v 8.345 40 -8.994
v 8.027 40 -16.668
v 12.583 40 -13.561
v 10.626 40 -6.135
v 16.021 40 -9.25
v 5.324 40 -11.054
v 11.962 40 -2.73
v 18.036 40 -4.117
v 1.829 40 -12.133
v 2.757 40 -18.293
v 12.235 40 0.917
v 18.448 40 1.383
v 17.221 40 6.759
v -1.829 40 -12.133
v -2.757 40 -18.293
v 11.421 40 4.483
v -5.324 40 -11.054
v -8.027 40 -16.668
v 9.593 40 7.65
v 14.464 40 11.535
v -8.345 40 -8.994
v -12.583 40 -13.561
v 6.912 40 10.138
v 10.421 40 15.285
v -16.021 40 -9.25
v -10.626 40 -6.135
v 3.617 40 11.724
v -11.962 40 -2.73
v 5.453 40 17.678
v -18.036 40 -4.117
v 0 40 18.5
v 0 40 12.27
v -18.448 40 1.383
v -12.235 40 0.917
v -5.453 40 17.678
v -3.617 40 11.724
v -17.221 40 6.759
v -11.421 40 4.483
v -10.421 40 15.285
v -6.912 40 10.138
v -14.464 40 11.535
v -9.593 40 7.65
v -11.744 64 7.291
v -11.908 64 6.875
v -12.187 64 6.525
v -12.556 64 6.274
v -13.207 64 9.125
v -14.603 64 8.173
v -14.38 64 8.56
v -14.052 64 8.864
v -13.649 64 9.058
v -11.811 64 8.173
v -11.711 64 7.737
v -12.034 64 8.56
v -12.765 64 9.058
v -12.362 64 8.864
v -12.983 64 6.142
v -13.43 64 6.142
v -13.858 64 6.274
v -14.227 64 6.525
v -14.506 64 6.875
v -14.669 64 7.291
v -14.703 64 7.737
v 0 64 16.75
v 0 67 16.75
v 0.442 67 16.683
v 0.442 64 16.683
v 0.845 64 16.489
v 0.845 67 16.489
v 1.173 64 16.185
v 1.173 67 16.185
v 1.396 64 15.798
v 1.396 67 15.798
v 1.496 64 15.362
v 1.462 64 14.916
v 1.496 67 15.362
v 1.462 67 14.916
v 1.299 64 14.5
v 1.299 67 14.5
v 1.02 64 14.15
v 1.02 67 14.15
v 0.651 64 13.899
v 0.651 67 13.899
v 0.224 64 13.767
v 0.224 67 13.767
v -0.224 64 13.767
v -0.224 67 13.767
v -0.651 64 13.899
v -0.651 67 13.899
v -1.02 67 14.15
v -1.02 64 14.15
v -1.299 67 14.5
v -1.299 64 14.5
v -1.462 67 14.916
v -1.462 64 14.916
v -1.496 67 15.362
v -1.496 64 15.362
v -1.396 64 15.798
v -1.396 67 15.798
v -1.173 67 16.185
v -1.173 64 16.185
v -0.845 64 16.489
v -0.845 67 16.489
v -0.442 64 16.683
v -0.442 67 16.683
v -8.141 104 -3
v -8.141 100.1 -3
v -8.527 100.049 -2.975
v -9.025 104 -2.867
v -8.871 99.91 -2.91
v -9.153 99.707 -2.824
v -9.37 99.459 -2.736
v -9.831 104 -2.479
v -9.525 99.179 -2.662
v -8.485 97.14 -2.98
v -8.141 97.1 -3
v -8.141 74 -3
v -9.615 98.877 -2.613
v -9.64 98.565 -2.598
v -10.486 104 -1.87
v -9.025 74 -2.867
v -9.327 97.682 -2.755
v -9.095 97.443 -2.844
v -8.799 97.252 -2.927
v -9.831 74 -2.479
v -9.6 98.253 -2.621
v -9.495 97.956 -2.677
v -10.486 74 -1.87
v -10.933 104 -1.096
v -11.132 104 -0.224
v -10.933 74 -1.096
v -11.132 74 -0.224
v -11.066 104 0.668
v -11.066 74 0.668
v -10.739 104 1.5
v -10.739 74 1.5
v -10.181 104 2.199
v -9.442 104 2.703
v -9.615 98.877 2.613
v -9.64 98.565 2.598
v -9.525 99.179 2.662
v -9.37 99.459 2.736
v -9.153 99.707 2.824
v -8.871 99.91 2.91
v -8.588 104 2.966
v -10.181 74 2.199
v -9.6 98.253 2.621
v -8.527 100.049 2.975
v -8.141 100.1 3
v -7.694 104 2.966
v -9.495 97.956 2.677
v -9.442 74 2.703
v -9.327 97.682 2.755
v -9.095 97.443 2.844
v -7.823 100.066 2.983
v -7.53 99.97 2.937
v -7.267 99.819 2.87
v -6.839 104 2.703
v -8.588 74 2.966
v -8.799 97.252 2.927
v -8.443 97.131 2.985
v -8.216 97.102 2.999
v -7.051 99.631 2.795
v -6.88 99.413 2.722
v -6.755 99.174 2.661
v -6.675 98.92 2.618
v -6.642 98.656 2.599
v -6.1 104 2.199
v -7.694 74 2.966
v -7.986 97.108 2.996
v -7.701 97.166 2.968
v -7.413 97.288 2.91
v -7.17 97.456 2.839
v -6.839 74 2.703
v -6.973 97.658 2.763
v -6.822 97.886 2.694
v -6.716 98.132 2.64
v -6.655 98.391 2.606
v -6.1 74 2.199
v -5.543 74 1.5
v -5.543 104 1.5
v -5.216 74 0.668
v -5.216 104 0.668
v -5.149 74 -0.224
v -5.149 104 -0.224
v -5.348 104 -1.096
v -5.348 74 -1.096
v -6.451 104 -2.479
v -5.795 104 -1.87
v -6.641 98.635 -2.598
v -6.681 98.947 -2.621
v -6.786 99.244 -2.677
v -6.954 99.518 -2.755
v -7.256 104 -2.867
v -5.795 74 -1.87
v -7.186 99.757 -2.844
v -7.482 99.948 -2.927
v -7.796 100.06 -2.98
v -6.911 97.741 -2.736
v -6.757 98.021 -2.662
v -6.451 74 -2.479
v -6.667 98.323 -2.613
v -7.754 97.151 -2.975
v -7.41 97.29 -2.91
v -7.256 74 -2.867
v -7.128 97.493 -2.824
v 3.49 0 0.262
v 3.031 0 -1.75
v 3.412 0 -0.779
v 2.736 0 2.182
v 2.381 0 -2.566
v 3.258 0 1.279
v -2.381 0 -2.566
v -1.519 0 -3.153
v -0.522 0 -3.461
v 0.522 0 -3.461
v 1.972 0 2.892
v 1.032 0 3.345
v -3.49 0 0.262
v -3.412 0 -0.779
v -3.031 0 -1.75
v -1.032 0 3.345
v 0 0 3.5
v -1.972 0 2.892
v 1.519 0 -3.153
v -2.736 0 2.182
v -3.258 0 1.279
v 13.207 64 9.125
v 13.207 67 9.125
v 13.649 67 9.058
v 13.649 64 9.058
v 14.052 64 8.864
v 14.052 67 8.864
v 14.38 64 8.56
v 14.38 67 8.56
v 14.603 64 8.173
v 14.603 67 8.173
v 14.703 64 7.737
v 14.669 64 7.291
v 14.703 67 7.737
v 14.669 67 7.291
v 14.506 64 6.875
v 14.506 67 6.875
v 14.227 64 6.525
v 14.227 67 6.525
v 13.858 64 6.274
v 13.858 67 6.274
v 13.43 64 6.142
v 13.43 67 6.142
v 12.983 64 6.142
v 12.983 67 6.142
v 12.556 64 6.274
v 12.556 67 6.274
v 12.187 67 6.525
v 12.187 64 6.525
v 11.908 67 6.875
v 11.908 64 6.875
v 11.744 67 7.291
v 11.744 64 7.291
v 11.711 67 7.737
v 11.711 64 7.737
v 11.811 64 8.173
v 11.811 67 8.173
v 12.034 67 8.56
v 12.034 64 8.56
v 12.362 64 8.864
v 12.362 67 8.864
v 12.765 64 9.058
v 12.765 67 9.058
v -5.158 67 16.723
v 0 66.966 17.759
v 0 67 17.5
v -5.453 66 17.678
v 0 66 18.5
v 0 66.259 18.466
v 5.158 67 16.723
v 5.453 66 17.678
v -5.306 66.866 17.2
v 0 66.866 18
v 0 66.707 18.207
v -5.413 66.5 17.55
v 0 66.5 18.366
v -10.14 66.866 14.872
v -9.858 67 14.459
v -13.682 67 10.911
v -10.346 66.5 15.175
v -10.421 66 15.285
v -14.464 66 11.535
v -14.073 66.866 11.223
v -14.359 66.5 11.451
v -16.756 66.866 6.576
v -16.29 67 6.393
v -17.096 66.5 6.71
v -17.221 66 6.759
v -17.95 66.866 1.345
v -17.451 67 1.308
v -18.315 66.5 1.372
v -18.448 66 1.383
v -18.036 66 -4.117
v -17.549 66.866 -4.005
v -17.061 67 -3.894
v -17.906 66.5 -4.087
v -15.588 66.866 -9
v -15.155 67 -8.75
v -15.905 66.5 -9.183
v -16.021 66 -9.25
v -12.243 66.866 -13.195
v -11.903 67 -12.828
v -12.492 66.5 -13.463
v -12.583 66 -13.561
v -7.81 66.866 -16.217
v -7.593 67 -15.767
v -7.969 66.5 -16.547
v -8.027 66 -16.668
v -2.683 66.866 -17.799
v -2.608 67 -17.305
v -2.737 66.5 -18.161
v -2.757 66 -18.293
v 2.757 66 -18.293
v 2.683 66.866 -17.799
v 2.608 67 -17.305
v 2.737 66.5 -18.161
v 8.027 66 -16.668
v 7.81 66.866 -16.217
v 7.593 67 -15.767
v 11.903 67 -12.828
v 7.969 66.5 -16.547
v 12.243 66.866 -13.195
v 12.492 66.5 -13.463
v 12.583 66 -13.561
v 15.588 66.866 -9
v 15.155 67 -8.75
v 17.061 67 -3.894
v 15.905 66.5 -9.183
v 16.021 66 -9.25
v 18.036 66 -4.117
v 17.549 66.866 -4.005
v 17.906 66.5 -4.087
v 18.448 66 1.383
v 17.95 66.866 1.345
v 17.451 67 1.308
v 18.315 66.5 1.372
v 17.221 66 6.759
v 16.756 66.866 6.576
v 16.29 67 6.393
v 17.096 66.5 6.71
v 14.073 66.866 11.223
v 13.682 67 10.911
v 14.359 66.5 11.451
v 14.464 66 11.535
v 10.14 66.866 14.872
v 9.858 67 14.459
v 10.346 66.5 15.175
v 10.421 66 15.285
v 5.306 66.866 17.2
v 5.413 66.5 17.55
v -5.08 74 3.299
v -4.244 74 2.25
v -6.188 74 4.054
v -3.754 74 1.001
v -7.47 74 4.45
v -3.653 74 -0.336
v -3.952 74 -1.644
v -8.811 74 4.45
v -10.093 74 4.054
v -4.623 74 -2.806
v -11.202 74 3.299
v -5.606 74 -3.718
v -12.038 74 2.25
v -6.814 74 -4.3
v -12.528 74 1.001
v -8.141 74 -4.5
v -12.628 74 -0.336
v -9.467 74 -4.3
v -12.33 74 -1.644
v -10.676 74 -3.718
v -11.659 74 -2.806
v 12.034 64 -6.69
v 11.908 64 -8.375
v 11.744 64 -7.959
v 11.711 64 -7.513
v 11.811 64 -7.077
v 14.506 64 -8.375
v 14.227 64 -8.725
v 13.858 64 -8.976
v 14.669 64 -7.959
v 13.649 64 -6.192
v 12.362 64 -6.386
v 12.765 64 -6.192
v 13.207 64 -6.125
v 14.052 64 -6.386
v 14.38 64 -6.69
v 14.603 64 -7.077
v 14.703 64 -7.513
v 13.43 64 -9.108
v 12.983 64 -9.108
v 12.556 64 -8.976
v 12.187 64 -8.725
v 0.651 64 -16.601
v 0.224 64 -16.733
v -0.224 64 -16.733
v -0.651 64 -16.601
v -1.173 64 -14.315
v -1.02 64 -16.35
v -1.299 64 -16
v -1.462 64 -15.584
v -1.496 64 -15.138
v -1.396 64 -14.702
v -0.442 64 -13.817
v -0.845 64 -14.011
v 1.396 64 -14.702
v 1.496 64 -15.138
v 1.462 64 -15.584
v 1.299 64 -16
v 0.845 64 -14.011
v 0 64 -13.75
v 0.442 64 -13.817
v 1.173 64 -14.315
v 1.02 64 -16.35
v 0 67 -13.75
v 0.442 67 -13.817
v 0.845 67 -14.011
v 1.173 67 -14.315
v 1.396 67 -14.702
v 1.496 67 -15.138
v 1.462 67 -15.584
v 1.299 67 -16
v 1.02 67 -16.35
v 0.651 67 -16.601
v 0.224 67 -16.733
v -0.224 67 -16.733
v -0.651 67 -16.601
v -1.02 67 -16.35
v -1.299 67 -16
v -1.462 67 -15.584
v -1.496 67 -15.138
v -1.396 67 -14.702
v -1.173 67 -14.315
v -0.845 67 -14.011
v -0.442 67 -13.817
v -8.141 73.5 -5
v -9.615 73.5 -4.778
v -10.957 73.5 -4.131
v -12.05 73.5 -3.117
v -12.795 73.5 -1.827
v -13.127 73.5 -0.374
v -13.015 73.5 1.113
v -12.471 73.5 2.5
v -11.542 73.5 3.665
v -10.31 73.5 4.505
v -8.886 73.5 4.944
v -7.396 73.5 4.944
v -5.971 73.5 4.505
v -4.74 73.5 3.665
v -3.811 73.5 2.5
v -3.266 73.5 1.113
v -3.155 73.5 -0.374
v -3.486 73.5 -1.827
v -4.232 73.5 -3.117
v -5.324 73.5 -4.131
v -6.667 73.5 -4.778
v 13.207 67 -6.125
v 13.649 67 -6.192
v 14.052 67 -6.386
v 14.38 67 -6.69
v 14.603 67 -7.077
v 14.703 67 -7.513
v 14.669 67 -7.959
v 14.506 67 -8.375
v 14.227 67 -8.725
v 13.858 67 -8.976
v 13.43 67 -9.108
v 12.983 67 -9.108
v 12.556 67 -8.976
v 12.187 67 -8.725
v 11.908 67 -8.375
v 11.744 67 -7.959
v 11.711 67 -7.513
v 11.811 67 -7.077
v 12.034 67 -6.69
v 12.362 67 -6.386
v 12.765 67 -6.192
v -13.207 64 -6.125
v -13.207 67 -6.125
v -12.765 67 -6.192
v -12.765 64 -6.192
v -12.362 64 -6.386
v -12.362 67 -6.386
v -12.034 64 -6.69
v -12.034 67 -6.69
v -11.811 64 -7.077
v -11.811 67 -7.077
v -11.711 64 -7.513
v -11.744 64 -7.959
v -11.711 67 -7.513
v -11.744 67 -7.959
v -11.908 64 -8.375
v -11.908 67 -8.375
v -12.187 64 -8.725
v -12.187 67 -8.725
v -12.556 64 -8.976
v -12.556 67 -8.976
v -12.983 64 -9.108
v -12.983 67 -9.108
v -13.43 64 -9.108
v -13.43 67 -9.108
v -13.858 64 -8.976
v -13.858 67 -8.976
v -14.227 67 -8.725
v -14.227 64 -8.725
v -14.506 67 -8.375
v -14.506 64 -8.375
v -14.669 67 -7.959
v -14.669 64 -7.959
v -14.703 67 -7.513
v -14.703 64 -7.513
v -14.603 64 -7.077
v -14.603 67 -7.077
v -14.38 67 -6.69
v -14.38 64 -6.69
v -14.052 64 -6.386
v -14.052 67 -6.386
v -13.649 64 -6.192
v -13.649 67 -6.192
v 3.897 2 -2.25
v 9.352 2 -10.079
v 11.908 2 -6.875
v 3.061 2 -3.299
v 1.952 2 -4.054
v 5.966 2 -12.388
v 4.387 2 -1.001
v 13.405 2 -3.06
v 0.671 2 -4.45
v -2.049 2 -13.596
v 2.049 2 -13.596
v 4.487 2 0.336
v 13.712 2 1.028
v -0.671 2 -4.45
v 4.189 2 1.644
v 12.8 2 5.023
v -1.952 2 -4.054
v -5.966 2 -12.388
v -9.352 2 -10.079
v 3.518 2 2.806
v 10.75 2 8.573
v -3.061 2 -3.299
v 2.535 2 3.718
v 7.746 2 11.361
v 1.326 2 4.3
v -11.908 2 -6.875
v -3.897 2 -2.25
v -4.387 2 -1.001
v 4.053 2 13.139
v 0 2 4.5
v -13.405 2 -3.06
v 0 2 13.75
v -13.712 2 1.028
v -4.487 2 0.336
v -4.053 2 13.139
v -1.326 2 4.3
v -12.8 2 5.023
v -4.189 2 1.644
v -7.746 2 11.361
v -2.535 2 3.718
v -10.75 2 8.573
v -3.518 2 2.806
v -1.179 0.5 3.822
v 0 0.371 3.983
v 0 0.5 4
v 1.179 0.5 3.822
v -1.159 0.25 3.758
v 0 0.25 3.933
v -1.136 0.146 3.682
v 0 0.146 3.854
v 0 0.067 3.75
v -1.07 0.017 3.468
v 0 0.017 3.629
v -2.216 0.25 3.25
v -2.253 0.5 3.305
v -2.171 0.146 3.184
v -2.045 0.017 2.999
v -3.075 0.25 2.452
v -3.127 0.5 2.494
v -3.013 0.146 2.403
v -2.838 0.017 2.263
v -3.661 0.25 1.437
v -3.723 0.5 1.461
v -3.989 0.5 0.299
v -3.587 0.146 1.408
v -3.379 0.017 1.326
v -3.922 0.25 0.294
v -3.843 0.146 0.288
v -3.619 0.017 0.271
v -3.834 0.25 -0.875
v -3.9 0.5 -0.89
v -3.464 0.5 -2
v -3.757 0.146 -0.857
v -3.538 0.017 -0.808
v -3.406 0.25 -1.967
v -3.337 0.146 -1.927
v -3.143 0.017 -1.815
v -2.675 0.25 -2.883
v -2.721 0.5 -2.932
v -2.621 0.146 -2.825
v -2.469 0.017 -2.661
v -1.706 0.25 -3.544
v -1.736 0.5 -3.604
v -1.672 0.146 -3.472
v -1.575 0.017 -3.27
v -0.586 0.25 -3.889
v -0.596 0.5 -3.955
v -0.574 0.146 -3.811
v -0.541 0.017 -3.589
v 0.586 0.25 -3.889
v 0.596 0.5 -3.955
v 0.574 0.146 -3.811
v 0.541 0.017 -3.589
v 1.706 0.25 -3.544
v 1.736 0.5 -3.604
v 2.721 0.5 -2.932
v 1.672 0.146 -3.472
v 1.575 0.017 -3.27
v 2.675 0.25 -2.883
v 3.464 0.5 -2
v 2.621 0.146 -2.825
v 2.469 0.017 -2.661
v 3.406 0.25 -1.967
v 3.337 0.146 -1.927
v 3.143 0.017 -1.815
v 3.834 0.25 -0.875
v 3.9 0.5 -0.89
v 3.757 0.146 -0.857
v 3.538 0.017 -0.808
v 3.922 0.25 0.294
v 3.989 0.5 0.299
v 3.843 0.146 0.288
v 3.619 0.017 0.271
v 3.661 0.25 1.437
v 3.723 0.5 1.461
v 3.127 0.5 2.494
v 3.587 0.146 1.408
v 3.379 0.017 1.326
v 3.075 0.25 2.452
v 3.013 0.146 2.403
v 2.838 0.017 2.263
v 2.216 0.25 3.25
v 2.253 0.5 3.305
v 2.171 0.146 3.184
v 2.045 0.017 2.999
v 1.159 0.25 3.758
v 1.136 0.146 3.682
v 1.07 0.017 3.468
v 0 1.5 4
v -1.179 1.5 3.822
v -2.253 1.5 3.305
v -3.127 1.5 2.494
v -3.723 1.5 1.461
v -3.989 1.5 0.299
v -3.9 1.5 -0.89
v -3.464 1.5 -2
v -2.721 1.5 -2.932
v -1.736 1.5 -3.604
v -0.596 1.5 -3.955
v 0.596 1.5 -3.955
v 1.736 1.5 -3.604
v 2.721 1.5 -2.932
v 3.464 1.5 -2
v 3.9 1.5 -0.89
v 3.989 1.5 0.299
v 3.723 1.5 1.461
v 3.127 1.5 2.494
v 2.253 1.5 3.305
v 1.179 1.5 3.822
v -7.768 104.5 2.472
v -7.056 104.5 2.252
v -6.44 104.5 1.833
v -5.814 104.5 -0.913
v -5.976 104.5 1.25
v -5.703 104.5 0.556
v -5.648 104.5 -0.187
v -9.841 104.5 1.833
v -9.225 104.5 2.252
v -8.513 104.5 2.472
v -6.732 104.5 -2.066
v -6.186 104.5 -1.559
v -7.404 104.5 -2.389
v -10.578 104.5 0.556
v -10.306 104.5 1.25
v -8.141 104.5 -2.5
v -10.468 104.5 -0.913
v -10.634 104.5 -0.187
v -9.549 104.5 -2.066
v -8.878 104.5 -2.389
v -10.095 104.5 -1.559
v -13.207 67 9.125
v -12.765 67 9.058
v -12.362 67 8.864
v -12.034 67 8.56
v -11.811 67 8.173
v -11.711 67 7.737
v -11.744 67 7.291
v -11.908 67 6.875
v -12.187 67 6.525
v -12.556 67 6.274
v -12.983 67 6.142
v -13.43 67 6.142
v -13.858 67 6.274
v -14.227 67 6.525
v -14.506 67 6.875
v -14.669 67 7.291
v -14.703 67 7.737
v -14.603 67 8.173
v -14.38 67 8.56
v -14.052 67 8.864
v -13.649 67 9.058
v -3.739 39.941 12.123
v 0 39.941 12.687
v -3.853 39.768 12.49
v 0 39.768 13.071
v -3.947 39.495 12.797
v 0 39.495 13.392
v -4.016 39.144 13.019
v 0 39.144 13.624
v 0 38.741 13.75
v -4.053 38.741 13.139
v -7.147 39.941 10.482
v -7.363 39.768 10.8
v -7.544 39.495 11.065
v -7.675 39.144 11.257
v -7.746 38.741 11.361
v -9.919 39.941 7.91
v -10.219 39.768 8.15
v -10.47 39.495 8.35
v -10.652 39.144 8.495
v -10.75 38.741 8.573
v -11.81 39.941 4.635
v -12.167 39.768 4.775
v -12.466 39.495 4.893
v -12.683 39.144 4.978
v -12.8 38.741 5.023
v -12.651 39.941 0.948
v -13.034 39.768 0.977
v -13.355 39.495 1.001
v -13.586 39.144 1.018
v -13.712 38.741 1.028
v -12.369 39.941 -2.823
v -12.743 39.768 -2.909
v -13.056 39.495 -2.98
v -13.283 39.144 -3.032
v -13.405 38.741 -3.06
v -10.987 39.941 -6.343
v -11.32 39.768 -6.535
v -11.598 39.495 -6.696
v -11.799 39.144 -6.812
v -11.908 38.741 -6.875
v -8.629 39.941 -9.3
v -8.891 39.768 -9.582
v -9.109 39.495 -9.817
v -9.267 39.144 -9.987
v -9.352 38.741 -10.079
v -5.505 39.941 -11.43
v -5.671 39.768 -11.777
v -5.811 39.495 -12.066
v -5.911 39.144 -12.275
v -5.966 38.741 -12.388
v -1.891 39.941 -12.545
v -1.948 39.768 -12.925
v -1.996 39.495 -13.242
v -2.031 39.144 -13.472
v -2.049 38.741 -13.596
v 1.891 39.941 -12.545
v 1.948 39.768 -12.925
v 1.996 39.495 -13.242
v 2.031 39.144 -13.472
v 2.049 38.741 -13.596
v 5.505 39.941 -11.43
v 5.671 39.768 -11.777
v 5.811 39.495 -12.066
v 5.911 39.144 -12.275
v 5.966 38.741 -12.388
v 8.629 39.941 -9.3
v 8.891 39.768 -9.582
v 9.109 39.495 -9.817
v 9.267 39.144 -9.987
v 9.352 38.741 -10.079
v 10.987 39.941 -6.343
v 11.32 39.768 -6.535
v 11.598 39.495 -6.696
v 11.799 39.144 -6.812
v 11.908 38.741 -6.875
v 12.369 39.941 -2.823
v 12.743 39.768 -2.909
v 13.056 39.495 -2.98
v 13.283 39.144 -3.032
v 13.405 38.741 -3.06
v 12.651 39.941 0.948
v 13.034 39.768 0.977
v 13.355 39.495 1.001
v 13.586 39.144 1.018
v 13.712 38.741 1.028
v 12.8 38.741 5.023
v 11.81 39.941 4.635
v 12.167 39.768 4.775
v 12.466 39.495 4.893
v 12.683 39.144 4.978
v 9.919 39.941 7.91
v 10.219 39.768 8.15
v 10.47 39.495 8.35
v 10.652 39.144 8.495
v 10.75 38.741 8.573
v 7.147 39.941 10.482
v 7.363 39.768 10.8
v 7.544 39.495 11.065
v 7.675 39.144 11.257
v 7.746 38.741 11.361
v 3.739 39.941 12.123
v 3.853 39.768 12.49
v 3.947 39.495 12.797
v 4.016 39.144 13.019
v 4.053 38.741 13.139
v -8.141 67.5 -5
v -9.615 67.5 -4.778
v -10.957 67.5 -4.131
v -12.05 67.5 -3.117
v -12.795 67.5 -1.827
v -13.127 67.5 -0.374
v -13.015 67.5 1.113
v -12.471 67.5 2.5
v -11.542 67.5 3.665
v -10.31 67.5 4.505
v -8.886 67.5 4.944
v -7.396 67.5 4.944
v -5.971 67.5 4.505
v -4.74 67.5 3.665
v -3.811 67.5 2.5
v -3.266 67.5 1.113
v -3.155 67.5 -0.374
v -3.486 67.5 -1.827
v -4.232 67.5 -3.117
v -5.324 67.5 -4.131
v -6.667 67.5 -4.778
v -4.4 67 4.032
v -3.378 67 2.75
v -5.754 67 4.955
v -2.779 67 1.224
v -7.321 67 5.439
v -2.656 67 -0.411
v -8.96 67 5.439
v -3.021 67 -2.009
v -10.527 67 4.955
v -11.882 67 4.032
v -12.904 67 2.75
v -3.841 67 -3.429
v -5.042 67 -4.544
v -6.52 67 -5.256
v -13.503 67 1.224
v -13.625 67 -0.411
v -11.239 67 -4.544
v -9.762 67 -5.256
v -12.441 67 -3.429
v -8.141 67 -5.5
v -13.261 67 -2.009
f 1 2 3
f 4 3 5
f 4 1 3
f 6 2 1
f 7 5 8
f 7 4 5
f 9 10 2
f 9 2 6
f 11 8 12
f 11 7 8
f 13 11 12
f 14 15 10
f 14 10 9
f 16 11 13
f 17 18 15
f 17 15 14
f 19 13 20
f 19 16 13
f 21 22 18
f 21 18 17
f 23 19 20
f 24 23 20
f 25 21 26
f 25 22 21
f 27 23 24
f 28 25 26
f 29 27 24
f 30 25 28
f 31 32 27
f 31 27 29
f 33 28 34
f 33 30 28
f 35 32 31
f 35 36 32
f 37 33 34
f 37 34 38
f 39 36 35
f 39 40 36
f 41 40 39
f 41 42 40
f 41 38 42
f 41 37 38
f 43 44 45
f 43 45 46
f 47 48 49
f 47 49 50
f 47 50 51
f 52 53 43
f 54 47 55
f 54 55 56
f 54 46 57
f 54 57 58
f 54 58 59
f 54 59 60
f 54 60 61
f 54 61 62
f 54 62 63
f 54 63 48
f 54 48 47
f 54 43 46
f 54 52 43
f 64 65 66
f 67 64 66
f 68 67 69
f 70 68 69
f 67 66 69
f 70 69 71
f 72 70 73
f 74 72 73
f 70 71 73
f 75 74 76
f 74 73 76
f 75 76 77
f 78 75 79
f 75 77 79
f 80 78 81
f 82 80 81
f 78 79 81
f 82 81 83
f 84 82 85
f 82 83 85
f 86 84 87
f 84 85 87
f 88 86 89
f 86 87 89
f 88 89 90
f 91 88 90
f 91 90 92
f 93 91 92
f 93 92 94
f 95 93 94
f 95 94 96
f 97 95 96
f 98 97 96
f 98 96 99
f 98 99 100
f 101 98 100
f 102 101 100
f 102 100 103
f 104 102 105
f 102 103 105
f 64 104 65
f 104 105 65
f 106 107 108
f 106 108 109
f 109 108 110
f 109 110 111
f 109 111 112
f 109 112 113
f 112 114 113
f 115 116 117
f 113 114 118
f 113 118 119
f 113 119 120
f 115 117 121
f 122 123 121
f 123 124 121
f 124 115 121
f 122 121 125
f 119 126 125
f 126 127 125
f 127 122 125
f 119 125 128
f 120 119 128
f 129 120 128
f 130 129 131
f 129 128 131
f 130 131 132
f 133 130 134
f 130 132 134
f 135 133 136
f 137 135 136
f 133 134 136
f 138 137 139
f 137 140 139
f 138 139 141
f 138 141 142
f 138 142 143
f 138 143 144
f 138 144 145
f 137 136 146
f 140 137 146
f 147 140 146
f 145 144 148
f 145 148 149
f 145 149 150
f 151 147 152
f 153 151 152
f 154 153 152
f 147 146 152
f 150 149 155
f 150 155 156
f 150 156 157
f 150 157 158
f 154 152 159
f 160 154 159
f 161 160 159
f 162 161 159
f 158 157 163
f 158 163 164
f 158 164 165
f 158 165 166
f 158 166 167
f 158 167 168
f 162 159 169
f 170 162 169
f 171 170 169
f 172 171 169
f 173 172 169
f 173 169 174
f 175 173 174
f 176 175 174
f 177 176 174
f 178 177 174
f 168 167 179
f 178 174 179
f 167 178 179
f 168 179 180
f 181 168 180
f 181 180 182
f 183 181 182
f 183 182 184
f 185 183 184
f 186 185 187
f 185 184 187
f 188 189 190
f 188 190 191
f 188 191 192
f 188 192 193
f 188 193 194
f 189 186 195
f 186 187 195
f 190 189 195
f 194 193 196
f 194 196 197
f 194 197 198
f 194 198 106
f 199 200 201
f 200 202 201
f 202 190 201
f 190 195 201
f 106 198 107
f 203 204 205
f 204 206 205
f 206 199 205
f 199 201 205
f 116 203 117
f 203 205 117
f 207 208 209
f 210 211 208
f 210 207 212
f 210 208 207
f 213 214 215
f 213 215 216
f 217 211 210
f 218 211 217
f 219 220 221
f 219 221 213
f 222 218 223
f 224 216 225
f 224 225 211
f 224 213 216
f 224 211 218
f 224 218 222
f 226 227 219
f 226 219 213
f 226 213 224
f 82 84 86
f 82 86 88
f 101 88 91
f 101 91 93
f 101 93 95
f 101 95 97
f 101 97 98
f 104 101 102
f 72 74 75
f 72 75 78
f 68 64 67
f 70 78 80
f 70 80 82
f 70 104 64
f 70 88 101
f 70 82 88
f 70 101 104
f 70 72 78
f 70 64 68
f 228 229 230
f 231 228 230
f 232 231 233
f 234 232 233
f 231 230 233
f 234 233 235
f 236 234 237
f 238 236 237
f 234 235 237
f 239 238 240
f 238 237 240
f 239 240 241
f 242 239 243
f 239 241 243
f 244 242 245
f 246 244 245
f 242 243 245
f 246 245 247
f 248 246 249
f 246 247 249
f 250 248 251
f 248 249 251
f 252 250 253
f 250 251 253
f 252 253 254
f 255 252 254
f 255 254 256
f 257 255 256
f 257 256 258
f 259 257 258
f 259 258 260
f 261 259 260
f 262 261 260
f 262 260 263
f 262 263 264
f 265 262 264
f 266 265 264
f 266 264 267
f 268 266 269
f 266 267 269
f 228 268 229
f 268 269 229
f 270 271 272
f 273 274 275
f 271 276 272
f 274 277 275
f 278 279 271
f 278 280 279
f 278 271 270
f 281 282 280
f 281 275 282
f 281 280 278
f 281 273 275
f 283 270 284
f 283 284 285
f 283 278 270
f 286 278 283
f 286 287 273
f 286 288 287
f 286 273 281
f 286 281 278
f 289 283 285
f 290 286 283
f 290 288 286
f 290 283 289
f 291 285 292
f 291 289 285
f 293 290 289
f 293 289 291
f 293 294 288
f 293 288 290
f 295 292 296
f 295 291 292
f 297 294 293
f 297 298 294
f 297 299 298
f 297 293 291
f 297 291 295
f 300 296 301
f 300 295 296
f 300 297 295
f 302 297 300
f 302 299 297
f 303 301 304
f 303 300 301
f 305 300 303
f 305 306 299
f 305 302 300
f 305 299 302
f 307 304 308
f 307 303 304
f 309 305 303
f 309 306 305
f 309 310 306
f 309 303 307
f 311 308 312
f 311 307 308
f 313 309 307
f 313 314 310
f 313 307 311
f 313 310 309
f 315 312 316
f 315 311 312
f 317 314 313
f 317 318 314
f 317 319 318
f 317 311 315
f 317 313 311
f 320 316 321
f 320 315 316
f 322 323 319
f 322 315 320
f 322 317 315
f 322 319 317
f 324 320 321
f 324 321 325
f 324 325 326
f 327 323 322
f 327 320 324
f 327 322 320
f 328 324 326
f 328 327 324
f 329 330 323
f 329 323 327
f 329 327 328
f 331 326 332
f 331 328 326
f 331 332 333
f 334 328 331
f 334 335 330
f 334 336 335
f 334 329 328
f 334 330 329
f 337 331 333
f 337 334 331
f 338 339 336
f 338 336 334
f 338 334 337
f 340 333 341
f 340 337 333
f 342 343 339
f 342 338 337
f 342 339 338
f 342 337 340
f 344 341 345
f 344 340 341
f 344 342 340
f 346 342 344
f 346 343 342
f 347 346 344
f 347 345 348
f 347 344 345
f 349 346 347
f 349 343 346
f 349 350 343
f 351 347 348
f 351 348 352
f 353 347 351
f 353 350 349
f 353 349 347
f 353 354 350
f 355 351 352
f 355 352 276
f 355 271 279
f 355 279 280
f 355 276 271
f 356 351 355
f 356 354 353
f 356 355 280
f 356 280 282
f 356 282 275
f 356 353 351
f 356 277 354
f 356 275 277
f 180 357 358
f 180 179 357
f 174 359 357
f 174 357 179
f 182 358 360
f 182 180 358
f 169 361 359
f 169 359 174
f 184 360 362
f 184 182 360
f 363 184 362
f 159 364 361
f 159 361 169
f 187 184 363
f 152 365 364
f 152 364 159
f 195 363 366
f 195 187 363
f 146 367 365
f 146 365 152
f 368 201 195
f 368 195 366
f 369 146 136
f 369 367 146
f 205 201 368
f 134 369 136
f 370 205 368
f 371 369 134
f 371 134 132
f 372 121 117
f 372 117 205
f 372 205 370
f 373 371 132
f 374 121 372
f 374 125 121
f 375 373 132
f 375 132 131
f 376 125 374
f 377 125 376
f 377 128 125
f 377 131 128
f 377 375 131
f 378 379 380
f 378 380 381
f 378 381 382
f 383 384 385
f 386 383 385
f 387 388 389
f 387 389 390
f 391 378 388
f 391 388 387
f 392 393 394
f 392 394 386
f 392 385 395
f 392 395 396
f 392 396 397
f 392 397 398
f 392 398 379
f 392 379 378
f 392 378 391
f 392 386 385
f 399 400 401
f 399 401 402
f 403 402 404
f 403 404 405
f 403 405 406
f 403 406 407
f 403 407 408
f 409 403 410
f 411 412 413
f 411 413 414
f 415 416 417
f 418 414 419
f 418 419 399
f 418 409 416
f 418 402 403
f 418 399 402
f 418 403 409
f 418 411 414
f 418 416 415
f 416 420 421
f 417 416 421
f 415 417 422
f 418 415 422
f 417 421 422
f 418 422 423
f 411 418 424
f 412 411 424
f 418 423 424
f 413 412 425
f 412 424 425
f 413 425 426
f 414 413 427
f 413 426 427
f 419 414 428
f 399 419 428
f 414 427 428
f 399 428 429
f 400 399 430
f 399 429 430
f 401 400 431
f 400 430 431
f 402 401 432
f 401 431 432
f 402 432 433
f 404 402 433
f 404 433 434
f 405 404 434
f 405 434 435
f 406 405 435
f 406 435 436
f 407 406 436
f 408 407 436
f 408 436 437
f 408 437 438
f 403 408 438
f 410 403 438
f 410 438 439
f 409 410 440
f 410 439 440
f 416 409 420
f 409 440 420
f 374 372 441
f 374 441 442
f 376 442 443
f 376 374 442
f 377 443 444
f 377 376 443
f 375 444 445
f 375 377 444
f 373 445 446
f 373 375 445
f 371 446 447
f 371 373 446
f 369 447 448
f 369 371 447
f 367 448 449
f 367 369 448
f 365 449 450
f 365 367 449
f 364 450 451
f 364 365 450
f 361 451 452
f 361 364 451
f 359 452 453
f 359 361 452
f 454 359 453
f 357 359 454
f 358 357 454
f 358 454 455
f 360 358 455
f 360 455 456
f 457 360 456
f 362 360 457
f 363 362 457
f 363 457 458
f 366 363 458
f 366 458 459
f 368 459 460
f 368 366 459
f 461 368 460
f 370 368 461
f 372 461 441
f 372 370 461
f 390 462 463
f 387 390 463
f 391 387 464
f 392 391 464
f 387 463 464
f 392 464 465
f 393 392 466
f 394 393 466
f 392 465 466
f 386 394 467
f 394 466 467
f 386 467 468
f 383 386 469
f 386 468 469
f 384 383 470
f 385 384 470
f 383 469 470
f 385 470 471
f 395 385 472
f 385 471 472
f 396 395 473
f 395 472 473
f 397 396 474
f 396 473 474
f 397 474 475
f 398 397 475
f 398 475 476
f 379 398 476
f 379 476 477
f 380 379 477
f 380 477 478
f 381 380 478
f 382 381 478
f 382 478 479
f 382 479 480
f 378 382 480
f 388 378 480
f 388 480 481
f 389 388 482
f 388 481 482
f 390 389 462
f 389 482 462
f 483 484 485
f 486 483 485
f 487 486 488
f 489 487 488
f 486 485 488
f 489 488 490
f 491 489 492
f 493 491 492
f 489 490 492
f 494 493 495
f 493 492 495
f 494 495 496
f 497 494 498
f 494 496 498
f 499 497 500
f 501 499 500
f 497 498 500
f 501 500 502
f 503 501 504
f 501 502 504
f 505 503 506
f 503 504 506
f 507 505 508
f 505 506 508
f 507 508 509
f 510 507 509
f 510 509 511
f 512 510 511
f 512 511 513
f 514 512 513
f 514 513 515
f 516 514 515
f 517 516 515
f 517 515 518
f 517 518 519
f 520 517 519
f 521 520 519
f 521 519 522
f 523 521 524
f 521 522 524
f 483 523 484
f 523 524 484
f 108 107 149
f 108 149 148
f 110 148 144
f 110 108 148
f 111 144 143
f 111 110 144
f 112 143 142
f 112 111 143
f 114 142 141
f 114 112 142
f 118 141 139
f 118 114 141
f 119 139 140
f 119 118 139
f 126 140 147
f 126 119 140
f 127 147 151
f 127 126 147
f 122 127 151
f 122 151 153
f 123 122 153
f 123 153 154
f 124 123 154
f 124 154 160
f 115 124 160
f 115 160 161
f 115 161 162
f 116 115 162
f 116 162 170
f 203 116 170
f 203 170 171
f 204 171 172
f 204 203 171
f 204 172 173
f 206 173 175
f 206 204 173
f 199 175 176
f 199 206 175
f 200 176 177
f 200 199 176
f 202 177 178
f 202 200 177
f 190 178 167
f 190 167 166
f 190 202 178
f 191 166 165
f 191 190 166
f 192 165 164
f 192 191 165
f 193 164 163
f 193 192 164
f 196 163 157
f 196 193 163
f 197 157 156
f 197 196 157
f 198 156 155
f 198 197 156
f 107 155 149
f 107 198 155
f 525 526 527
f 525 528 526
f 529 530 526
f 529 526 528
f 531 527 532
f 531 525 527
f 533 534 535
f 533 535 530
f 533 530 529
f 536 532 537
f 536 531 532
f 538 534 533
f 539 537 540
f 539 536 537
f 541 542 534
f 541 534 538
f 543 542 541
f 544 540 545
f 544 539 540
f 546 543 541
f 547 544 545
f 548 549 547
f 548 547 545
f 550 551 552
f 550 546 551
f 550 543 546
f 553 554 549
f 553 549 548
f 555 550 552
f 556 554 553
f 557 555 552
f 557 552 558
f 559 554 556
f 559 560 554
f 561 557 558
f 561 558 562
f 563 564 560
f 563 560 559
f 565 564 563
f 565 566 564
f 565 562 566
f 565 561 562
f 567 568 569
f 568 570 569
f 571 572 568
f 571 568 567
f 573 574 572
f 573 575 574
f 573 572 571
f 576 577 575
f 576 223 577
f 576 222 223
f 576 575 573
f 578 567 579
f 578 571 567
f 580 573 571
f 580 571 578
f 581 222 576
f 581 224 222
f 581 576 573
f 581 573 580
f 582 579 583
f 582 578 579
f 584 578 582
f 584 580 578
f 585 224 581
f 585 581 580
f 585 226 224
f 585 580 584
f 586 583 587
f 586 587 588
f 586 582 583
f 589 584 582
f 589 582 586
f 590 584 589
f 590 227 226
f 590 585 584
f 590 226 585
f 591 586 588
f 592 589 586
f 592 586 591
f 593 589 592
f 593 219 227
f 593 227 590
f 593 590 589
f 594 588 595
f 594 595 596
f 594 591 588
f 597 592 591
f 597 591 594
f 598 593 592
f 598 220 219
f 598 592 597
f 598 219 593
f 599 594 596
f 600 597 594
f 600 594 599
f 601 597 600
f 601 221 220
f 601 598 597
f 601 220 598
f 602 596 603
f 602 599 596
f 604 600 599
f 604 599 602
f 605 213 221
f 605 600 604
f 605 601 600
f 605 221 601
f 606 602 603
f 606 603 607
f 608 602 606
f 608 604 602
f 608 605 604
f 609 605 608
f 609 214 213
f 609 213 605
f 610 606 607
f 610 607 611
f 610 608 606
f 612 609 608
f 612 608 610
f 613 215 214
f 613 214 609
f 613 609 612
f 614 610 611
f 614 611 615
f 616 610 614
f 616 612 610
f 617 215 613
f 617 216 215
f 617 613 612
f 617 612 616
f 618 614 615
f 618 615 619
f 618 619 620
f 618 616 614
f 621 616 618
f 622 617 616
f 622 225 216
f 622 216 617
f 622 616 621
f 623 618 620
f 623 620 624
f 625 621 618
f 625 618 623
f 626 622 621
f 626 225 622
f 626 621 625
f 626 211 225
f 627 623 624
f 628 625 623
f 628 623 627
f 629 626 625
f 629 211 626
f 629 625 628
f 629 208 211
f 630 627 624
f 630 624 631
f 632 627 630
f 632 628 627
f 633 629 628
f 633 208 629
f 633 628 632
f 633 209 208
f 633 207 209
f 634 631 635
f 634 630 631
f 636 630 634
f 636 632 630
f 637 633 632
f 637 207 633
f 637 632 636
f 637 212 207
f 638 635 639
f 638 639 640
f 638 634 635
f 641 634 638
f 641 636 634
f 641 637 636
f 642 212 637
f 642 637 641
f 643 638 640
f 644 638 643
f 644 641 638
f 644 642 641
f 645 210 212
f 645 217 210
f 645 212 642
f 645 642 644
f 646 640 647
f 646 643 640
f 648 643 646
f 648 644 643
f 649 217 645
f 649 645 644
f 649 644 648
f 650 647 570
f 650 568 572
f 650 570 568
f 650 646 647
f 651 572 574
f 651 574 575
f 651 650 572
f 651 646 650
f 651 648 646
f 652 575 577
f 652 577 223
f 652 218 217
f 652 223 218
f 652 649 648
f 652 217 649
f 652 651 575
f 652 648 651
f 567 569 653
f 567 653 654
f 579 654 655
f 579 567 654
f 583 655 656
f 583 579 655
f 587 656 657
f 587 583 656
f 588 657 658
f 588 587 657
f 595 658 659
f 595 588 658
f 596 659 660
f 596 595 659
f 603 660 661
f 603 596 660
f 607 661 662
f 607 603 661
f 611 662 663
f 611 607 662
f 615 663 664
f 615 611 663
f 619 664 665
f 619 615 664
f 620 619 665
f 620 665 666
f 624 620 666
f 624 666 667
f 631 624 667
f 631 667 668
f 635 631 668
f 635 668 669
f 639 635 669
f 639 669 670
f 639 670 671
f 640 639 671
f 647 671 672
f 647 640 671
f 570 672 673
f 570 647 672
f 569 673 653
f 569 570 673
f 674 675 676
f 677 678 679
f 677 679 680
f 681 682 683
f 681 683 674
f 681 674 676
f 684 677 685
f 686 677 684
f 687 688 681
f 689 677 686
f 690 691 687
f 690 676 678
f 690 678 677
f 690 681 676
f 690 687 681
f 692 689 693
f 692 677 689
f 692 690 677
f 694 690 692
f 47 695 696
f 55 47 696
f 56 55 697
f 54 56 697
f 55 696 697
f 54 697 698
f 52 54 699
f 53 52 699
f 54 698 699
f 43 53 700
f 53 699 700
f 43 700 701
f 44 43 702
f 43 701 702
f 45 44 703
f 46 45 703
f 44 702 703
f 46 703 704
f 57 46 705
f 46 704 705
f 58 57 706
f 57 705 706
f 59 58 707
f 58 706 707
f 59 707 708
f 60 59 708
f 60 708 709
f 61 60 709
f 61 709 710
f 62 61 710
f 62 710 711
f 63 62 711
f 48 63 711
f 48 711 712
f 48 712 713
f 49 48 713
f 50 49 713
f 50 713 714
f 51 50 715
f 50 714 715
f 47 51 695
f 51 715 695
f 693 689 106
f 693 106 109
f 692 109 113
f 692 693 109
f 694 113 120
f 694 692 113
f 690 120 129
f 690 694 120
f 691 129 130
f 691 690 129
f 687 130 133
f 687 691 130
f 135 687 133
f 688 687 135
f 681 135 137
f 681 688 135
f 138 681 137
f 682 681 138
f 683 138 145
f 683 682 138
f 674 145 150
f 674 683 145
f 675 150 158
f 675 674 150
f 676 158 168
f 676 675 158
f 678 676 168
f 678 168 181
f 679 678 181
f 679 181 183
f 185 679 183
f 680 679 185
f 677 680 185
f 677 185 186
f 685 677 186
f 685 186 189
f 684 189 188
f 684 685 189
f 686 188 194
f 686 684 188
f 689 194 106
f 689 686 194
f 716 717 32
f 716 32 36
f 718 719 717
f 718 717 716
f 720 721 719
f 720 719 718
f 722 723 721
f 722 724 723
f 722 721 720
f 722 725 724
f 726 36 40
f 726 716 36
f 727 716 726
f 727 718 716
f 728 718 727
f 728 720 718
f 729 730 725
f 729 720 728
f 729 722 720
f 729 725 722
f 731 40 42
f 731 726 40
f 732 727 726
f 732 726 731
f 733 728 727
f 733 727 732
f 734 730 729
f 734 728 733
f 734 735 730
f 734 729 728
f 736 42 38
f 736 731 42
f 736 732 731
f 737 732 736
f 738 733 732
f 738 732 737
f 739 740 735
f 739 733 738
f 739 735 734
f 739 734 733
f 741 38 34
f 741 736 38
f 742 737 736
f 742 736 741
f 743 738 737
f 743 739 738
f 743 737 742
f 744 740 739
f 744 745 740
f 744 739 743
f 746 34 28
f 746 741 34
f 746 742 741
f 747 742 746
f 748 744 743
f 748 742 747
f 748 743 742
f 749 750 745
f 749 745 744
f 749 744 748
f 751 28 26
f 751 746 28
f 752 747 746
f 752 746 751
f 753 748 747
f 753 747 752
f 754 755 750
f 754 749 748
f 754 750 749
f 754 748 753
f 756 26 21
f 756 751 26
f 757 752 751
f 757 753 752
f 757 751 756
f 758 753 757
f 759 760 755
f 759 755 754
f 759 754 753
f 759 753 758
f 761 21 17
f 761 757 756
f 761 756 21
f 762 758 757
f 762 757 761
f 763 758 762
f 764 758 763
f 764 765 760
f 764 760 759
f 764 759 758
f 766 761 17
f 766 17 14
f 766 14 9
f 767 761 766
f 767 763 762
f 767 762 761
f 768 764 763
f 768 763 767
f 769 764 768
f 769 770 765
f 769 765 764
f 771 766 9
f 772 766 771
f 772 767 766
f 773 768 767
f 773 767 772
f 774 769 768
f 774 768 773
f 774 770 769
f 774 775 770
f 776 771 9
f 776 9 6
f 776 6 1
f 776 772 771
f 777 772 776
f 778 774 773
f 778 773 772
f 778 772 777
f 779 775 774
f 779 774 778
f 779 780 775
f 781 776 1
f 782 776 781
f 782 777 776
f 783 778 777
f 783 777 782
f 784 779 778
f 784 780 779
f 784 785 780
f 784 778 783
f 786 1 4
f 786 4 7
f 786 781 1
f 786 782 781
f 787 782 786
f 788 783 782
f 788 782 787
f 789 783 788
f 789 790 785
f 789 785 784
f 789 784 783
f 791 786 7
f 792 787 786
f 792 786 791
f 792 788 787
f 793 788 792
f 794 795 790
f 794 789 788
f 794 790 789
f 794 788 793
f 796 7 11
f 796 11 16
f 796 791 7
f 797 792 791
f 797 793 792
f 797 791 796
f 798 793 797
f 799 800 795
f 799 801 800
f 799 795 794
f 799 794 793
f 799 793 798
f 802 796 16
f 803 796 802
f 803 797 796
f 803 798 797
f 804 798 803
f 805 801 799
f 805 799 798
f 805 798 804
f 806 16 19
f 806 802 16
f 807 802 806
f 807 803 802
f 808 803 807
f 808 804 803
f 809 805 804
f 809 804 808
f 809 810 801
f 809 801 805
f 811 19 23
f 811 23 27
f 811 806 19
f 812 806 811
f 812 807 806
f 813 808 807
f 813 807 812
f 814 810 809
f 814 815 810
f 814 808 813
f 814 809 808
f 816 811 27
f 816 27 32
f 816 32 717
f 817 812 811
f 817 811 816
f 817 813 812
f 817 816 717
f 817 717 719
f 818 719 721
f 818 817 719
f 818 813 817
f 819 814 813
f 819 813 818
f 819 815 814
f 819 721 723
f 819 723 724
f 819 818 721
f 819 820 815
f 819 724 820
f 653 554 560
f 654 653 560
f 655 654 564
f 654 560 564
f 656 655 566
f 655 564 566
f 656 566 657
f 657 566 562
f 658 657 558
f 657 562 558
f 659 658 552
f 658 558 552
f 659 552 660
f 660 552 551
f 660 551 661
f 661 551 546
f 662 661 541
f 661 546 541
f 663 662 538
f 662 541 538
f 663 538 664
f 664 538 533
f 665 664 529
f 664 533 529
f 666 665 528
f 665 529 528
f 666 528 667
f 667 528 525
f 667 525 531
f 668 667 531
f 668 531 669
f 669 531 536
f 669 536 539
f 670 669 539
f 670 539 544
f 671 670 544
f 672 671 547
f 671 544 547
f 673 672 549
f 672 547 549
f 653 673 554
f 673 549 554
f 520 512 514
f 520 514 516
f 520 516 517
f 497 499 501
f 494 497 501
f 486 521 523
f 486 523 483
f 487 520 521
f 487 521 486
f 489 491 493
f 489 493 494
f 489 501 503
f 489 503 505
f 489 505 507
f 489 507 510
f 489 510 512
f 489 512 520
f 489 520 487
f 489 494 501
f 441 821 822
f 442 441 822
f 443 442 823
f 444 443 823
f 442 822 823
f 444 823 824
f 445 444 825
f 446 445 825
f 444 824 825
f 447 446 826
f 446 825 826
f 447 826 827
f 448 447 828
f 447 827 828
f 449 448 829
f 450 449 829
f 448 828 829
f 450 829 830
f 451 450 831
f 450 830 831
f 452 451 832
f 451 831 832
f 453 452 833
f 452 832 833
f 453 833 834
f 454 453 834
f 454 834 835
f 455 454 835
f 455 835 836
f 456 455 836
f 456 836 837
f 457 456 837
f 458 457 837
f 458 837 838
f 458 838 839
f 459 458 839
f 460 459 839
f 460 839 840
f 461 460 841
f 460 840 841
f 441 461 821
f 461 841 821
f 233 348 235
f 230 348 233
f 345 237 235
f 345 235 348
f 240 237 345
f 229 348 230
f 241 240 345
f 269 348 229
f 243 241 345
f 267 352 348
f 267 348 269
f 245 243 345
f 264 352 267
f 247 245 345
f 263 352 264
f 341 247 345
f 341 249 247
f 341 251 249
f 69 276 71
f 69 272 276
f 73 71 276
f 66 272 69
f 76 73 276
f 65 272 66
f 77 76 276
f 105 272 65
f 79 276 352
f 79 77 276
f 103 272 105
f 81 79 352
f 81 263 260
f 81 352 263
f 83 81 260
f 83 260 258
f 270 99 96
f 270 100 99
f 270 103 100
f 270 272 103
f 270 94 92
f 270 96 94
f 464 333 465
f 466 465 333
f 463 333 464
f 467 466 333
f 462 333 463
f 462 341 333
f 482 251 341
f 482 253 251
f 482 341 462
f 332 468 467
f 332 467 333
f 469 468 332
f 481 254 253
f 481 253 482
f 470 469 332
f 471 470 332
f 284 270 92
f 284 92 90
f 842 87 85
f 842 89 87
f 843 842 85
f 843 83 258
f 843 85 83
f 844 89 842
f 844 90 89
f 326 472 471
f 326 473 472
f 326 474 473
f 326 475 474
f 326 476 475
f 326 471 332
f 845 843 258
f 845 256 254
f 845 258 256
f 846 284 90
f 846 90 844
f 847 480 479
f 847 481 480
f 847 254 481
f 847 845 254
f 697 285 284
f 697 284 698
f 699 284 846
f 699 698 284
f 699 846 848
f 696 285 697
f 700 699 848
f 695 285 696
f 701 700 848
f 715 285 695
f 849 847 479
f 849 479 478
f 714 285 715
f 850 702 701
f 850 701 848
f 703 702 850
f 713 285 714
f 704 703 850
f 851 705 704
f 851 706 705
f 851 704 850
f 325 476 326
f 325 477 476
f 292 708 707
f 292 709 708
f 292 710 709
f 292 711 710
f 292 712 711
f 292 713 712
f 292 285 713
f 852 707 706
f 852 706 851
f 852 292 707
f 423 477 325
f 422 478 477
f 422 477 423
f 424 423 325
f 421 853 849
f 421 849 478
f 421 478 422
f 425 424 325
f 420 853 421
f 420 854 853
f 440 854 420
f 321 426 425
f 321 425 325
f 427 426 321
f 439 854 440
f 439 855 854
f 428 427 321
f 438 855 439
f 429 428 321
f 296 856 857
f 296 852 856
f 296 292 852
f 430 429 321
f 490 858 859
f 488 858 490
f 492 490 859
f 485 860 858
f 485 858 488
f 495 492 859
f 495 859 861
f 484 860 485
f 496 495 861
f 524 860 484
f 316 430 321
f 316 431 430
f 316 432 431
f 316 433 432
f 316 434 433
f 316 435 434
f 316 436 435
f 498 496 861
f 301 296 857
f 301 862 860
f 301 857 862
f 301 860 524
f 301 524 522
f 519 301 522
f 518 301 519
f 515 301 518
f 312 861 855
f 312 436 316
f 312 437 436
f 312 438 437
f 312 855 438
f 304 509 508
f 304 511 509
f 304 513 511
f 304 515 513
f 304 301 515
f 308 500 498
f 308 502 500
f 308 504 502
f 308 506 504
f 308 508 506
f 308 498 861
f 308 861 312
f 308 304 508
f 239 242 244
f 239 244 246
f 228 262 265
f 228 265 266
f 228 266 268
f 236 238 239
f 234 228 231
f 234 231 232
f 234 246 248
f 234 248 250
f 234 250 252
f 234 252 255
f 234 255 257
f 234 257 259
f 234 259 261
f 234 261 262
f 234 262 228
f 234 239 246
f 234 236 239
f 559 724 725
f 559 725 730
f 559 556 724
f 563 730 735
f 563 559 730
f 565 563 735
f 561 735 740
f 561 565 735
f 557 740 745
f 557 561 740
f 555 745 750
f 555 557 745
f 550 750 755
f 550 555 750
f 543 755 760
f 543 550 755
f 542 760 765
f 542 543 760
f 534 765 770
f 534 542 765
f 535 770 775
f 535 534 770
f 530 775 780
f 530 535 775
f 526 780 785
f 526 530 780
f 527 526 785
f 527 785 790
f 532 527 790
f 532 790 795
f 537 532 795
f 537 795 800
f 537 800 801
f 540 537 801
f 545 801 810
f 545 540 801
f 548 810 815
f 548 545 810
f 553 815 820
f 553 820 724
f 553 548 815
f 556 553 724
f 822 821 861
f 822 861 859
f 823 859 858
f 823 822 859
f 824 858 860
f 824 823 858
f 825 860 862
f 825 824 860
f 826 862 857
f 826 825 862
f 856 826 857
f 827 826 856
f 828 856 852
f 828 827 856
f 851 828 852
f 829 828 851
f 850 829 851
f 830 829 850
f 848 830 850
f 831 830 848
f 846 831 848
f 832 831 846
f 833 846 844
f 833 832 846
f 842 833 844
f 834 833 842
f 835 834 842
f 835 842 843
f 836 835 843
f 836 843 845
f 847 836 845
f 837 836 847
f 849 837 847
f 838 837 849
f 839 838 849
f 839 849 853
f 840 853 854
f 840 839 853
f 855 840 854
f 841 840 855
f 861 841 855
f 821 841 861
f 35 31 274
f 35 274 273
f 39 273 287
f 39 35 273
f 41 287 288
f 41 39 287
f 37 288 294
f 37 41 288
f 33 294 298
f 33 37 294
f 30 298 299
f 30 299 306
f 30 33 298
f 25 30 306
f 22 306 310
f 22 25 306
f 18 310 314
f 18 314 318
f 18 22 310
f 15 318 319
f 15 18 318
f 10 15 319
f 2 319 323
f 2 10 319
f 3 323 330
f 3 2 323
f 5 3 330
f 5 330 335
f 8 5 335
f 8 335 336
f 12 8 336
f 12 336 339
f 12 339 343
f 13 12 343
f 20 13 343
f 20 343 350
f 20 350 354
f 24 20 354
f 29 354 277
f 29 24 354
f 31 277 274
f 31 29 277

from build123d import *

# Parameters (mm, degrees)
SKETCH2_R               = 5
BOSS_EXTRUDE1_DEPTH     = 7
SKETCH3_R               = 3
BOSS_EXTRUDE2_DEPTH     = 30.5
SKETCH4_R               = 1.5
CUT_EXTRUDE1_DEPTH      = 3
CUT_EXTRUDE2_DEPTH      = 4
CUT_EXTRUDE2_DEPTH_BACK = 4
SKETCH5_R               = 1.5
CHAMFER1_SIZE           = 0.5
FILLET1_R               = 0.5
CHAMFER2_SIZE           = 0.5
CHAMFER3_SIZE           = 0.5
FILLET4_R               = 1


with BuildPart() as part:
    # Sketch1 → Revolve1 (revolve)
    with BuildSketch(Plane.XY):
        Polygon((0, 67), (18.5, 67), (18.5, 40), (13.75, 40), (13.75, 2), (4, 2), (4, 0), (0, 0), align=None)
    revolve(axis=Axis((0, 116.312873798, 0), (0, -1, 0)))

    # Sketch2 → Boss-Extrude1 (add)
    with BuildSketch(Plane(origin=(0, 67, 0), x_dir=(1, 0, 0), z_dir=(0, 1, 0))):
        with Locations((-8.140754401, 0)):
            Circle(SKETCH2_R)
    extrude(amount=BOSS_EXTRUDE1_DEPTH)

    # Sketch3 → Boss-Extrude2 (add)
    with BuildSketch(Plane(origin=(0, 74, 0), x_dir=(1, 0, 0), z_dir=(0, 1, 0))):
        with Locations((-8.140754401, 0)):
            Circle(SKETCH3_R)
    extrude(amount=BOSS_EXTRUDE2_DEPTH)

    # Sketch4 → Cut-Extrude1 (cut)
    with BuildSketch(Plane(origin=(0, 67, 0), x_dir=(1, 0, 0), z_dir=(0, 1, 0))):
        with Locations((0, 15.25)):
            Circle(SKETCH4_R)
        with Locations((13.206887408, 7.625)):
            Circle(SKETCH4_R)
        with Locations((13.206887408, -7.625)):
            Circle(SKETCH4_R)
        with Locations((0, -15.25)):
            Circle(SKETCH4_R)
        with Locations((-13.206887408, -7.625)):
            Circle(SKETCH4_R)
        with Locations((-13.206887408, 7.625)):
            Circle(SKETCH4_R)
    extrude(amount=-CUT_EXTRUDE1_DEPTH, mode=Mode.SUBTRACT)

    # Sketch5 → Cut-Extrude2 (cut, two sides: drawn at the far end of the back side and taken through both)
    with BuildSketch(Plane.XY.offset(-CUT_EXTRUDE2_DEPTH_BACK)):
        with Locations((-8.140754401, 98.6)):
            Circle(SKETCH5_R)
    extrude(amount=CUT_EXTRUDE2_DEPTH + CUT_EXTRUDE2_DEPTH_BACK, mode=Mode.SUBTRACT)

    # Chamfer1
    chamfer1_edges = [part.edges().sort_by_distance(p)[0] for p in [
        (-13.140754401, 67, 0),
        (-13.140754401, 74, 0),
    ]]
    chamfer(chamfer1_edges, length=CHAMFER1_SIZE)

    # Fillet1
    fillet1_edges = [part.edges().sort_by_distance(p)[0] for p in [
        (-4, 0, 0),
    ]]
    fillet(fillet1_edges, radius=FILLET1_R)

    # Chamfer2
    chamfer2_edges = [part.edges().sort_by_distance(p)[0] for p in [
        (-4, 2, 0),
    ]]
    chamfer(chamfer2_edges, length=CHAMFER2_SIZE)

    # Chamfer3
    chamfer3_edges = [part.edges().sort_by_distance(p)[0] for p in [
        (-11.140754401, 104.5, 0),
    ]]
    chamfer(chamfer3_edges, length=CHAMFER3_SIZE)

    # Fillet4
    fillet4_edges = [part.edges().sort_by_distance(p)[0] for p in [
        (-18.5, 67, 0),
    ]]
    fillet(fillet4_edges, radius=FILLET4_R)

    # Sketch6 → Cut-Revolve1 (revolve, cut)
    with BuildSketch(Plane.XY):
        with BuildLine():
            Line((13.769543402, 40), (12.269543402, 40))
            ThreePointArc((12.269543402, 40), (13.330203573, 39.560660172), (13.769543402, 38.5))
            Line((13.769543402, 38.5), (13.769543402, 40))
        make_face()
    revolve(axis=Axis((0, 116.312873798, 0), (0, -1, 0)), mode=Mode.SUBTRACT)


solid = part.part
